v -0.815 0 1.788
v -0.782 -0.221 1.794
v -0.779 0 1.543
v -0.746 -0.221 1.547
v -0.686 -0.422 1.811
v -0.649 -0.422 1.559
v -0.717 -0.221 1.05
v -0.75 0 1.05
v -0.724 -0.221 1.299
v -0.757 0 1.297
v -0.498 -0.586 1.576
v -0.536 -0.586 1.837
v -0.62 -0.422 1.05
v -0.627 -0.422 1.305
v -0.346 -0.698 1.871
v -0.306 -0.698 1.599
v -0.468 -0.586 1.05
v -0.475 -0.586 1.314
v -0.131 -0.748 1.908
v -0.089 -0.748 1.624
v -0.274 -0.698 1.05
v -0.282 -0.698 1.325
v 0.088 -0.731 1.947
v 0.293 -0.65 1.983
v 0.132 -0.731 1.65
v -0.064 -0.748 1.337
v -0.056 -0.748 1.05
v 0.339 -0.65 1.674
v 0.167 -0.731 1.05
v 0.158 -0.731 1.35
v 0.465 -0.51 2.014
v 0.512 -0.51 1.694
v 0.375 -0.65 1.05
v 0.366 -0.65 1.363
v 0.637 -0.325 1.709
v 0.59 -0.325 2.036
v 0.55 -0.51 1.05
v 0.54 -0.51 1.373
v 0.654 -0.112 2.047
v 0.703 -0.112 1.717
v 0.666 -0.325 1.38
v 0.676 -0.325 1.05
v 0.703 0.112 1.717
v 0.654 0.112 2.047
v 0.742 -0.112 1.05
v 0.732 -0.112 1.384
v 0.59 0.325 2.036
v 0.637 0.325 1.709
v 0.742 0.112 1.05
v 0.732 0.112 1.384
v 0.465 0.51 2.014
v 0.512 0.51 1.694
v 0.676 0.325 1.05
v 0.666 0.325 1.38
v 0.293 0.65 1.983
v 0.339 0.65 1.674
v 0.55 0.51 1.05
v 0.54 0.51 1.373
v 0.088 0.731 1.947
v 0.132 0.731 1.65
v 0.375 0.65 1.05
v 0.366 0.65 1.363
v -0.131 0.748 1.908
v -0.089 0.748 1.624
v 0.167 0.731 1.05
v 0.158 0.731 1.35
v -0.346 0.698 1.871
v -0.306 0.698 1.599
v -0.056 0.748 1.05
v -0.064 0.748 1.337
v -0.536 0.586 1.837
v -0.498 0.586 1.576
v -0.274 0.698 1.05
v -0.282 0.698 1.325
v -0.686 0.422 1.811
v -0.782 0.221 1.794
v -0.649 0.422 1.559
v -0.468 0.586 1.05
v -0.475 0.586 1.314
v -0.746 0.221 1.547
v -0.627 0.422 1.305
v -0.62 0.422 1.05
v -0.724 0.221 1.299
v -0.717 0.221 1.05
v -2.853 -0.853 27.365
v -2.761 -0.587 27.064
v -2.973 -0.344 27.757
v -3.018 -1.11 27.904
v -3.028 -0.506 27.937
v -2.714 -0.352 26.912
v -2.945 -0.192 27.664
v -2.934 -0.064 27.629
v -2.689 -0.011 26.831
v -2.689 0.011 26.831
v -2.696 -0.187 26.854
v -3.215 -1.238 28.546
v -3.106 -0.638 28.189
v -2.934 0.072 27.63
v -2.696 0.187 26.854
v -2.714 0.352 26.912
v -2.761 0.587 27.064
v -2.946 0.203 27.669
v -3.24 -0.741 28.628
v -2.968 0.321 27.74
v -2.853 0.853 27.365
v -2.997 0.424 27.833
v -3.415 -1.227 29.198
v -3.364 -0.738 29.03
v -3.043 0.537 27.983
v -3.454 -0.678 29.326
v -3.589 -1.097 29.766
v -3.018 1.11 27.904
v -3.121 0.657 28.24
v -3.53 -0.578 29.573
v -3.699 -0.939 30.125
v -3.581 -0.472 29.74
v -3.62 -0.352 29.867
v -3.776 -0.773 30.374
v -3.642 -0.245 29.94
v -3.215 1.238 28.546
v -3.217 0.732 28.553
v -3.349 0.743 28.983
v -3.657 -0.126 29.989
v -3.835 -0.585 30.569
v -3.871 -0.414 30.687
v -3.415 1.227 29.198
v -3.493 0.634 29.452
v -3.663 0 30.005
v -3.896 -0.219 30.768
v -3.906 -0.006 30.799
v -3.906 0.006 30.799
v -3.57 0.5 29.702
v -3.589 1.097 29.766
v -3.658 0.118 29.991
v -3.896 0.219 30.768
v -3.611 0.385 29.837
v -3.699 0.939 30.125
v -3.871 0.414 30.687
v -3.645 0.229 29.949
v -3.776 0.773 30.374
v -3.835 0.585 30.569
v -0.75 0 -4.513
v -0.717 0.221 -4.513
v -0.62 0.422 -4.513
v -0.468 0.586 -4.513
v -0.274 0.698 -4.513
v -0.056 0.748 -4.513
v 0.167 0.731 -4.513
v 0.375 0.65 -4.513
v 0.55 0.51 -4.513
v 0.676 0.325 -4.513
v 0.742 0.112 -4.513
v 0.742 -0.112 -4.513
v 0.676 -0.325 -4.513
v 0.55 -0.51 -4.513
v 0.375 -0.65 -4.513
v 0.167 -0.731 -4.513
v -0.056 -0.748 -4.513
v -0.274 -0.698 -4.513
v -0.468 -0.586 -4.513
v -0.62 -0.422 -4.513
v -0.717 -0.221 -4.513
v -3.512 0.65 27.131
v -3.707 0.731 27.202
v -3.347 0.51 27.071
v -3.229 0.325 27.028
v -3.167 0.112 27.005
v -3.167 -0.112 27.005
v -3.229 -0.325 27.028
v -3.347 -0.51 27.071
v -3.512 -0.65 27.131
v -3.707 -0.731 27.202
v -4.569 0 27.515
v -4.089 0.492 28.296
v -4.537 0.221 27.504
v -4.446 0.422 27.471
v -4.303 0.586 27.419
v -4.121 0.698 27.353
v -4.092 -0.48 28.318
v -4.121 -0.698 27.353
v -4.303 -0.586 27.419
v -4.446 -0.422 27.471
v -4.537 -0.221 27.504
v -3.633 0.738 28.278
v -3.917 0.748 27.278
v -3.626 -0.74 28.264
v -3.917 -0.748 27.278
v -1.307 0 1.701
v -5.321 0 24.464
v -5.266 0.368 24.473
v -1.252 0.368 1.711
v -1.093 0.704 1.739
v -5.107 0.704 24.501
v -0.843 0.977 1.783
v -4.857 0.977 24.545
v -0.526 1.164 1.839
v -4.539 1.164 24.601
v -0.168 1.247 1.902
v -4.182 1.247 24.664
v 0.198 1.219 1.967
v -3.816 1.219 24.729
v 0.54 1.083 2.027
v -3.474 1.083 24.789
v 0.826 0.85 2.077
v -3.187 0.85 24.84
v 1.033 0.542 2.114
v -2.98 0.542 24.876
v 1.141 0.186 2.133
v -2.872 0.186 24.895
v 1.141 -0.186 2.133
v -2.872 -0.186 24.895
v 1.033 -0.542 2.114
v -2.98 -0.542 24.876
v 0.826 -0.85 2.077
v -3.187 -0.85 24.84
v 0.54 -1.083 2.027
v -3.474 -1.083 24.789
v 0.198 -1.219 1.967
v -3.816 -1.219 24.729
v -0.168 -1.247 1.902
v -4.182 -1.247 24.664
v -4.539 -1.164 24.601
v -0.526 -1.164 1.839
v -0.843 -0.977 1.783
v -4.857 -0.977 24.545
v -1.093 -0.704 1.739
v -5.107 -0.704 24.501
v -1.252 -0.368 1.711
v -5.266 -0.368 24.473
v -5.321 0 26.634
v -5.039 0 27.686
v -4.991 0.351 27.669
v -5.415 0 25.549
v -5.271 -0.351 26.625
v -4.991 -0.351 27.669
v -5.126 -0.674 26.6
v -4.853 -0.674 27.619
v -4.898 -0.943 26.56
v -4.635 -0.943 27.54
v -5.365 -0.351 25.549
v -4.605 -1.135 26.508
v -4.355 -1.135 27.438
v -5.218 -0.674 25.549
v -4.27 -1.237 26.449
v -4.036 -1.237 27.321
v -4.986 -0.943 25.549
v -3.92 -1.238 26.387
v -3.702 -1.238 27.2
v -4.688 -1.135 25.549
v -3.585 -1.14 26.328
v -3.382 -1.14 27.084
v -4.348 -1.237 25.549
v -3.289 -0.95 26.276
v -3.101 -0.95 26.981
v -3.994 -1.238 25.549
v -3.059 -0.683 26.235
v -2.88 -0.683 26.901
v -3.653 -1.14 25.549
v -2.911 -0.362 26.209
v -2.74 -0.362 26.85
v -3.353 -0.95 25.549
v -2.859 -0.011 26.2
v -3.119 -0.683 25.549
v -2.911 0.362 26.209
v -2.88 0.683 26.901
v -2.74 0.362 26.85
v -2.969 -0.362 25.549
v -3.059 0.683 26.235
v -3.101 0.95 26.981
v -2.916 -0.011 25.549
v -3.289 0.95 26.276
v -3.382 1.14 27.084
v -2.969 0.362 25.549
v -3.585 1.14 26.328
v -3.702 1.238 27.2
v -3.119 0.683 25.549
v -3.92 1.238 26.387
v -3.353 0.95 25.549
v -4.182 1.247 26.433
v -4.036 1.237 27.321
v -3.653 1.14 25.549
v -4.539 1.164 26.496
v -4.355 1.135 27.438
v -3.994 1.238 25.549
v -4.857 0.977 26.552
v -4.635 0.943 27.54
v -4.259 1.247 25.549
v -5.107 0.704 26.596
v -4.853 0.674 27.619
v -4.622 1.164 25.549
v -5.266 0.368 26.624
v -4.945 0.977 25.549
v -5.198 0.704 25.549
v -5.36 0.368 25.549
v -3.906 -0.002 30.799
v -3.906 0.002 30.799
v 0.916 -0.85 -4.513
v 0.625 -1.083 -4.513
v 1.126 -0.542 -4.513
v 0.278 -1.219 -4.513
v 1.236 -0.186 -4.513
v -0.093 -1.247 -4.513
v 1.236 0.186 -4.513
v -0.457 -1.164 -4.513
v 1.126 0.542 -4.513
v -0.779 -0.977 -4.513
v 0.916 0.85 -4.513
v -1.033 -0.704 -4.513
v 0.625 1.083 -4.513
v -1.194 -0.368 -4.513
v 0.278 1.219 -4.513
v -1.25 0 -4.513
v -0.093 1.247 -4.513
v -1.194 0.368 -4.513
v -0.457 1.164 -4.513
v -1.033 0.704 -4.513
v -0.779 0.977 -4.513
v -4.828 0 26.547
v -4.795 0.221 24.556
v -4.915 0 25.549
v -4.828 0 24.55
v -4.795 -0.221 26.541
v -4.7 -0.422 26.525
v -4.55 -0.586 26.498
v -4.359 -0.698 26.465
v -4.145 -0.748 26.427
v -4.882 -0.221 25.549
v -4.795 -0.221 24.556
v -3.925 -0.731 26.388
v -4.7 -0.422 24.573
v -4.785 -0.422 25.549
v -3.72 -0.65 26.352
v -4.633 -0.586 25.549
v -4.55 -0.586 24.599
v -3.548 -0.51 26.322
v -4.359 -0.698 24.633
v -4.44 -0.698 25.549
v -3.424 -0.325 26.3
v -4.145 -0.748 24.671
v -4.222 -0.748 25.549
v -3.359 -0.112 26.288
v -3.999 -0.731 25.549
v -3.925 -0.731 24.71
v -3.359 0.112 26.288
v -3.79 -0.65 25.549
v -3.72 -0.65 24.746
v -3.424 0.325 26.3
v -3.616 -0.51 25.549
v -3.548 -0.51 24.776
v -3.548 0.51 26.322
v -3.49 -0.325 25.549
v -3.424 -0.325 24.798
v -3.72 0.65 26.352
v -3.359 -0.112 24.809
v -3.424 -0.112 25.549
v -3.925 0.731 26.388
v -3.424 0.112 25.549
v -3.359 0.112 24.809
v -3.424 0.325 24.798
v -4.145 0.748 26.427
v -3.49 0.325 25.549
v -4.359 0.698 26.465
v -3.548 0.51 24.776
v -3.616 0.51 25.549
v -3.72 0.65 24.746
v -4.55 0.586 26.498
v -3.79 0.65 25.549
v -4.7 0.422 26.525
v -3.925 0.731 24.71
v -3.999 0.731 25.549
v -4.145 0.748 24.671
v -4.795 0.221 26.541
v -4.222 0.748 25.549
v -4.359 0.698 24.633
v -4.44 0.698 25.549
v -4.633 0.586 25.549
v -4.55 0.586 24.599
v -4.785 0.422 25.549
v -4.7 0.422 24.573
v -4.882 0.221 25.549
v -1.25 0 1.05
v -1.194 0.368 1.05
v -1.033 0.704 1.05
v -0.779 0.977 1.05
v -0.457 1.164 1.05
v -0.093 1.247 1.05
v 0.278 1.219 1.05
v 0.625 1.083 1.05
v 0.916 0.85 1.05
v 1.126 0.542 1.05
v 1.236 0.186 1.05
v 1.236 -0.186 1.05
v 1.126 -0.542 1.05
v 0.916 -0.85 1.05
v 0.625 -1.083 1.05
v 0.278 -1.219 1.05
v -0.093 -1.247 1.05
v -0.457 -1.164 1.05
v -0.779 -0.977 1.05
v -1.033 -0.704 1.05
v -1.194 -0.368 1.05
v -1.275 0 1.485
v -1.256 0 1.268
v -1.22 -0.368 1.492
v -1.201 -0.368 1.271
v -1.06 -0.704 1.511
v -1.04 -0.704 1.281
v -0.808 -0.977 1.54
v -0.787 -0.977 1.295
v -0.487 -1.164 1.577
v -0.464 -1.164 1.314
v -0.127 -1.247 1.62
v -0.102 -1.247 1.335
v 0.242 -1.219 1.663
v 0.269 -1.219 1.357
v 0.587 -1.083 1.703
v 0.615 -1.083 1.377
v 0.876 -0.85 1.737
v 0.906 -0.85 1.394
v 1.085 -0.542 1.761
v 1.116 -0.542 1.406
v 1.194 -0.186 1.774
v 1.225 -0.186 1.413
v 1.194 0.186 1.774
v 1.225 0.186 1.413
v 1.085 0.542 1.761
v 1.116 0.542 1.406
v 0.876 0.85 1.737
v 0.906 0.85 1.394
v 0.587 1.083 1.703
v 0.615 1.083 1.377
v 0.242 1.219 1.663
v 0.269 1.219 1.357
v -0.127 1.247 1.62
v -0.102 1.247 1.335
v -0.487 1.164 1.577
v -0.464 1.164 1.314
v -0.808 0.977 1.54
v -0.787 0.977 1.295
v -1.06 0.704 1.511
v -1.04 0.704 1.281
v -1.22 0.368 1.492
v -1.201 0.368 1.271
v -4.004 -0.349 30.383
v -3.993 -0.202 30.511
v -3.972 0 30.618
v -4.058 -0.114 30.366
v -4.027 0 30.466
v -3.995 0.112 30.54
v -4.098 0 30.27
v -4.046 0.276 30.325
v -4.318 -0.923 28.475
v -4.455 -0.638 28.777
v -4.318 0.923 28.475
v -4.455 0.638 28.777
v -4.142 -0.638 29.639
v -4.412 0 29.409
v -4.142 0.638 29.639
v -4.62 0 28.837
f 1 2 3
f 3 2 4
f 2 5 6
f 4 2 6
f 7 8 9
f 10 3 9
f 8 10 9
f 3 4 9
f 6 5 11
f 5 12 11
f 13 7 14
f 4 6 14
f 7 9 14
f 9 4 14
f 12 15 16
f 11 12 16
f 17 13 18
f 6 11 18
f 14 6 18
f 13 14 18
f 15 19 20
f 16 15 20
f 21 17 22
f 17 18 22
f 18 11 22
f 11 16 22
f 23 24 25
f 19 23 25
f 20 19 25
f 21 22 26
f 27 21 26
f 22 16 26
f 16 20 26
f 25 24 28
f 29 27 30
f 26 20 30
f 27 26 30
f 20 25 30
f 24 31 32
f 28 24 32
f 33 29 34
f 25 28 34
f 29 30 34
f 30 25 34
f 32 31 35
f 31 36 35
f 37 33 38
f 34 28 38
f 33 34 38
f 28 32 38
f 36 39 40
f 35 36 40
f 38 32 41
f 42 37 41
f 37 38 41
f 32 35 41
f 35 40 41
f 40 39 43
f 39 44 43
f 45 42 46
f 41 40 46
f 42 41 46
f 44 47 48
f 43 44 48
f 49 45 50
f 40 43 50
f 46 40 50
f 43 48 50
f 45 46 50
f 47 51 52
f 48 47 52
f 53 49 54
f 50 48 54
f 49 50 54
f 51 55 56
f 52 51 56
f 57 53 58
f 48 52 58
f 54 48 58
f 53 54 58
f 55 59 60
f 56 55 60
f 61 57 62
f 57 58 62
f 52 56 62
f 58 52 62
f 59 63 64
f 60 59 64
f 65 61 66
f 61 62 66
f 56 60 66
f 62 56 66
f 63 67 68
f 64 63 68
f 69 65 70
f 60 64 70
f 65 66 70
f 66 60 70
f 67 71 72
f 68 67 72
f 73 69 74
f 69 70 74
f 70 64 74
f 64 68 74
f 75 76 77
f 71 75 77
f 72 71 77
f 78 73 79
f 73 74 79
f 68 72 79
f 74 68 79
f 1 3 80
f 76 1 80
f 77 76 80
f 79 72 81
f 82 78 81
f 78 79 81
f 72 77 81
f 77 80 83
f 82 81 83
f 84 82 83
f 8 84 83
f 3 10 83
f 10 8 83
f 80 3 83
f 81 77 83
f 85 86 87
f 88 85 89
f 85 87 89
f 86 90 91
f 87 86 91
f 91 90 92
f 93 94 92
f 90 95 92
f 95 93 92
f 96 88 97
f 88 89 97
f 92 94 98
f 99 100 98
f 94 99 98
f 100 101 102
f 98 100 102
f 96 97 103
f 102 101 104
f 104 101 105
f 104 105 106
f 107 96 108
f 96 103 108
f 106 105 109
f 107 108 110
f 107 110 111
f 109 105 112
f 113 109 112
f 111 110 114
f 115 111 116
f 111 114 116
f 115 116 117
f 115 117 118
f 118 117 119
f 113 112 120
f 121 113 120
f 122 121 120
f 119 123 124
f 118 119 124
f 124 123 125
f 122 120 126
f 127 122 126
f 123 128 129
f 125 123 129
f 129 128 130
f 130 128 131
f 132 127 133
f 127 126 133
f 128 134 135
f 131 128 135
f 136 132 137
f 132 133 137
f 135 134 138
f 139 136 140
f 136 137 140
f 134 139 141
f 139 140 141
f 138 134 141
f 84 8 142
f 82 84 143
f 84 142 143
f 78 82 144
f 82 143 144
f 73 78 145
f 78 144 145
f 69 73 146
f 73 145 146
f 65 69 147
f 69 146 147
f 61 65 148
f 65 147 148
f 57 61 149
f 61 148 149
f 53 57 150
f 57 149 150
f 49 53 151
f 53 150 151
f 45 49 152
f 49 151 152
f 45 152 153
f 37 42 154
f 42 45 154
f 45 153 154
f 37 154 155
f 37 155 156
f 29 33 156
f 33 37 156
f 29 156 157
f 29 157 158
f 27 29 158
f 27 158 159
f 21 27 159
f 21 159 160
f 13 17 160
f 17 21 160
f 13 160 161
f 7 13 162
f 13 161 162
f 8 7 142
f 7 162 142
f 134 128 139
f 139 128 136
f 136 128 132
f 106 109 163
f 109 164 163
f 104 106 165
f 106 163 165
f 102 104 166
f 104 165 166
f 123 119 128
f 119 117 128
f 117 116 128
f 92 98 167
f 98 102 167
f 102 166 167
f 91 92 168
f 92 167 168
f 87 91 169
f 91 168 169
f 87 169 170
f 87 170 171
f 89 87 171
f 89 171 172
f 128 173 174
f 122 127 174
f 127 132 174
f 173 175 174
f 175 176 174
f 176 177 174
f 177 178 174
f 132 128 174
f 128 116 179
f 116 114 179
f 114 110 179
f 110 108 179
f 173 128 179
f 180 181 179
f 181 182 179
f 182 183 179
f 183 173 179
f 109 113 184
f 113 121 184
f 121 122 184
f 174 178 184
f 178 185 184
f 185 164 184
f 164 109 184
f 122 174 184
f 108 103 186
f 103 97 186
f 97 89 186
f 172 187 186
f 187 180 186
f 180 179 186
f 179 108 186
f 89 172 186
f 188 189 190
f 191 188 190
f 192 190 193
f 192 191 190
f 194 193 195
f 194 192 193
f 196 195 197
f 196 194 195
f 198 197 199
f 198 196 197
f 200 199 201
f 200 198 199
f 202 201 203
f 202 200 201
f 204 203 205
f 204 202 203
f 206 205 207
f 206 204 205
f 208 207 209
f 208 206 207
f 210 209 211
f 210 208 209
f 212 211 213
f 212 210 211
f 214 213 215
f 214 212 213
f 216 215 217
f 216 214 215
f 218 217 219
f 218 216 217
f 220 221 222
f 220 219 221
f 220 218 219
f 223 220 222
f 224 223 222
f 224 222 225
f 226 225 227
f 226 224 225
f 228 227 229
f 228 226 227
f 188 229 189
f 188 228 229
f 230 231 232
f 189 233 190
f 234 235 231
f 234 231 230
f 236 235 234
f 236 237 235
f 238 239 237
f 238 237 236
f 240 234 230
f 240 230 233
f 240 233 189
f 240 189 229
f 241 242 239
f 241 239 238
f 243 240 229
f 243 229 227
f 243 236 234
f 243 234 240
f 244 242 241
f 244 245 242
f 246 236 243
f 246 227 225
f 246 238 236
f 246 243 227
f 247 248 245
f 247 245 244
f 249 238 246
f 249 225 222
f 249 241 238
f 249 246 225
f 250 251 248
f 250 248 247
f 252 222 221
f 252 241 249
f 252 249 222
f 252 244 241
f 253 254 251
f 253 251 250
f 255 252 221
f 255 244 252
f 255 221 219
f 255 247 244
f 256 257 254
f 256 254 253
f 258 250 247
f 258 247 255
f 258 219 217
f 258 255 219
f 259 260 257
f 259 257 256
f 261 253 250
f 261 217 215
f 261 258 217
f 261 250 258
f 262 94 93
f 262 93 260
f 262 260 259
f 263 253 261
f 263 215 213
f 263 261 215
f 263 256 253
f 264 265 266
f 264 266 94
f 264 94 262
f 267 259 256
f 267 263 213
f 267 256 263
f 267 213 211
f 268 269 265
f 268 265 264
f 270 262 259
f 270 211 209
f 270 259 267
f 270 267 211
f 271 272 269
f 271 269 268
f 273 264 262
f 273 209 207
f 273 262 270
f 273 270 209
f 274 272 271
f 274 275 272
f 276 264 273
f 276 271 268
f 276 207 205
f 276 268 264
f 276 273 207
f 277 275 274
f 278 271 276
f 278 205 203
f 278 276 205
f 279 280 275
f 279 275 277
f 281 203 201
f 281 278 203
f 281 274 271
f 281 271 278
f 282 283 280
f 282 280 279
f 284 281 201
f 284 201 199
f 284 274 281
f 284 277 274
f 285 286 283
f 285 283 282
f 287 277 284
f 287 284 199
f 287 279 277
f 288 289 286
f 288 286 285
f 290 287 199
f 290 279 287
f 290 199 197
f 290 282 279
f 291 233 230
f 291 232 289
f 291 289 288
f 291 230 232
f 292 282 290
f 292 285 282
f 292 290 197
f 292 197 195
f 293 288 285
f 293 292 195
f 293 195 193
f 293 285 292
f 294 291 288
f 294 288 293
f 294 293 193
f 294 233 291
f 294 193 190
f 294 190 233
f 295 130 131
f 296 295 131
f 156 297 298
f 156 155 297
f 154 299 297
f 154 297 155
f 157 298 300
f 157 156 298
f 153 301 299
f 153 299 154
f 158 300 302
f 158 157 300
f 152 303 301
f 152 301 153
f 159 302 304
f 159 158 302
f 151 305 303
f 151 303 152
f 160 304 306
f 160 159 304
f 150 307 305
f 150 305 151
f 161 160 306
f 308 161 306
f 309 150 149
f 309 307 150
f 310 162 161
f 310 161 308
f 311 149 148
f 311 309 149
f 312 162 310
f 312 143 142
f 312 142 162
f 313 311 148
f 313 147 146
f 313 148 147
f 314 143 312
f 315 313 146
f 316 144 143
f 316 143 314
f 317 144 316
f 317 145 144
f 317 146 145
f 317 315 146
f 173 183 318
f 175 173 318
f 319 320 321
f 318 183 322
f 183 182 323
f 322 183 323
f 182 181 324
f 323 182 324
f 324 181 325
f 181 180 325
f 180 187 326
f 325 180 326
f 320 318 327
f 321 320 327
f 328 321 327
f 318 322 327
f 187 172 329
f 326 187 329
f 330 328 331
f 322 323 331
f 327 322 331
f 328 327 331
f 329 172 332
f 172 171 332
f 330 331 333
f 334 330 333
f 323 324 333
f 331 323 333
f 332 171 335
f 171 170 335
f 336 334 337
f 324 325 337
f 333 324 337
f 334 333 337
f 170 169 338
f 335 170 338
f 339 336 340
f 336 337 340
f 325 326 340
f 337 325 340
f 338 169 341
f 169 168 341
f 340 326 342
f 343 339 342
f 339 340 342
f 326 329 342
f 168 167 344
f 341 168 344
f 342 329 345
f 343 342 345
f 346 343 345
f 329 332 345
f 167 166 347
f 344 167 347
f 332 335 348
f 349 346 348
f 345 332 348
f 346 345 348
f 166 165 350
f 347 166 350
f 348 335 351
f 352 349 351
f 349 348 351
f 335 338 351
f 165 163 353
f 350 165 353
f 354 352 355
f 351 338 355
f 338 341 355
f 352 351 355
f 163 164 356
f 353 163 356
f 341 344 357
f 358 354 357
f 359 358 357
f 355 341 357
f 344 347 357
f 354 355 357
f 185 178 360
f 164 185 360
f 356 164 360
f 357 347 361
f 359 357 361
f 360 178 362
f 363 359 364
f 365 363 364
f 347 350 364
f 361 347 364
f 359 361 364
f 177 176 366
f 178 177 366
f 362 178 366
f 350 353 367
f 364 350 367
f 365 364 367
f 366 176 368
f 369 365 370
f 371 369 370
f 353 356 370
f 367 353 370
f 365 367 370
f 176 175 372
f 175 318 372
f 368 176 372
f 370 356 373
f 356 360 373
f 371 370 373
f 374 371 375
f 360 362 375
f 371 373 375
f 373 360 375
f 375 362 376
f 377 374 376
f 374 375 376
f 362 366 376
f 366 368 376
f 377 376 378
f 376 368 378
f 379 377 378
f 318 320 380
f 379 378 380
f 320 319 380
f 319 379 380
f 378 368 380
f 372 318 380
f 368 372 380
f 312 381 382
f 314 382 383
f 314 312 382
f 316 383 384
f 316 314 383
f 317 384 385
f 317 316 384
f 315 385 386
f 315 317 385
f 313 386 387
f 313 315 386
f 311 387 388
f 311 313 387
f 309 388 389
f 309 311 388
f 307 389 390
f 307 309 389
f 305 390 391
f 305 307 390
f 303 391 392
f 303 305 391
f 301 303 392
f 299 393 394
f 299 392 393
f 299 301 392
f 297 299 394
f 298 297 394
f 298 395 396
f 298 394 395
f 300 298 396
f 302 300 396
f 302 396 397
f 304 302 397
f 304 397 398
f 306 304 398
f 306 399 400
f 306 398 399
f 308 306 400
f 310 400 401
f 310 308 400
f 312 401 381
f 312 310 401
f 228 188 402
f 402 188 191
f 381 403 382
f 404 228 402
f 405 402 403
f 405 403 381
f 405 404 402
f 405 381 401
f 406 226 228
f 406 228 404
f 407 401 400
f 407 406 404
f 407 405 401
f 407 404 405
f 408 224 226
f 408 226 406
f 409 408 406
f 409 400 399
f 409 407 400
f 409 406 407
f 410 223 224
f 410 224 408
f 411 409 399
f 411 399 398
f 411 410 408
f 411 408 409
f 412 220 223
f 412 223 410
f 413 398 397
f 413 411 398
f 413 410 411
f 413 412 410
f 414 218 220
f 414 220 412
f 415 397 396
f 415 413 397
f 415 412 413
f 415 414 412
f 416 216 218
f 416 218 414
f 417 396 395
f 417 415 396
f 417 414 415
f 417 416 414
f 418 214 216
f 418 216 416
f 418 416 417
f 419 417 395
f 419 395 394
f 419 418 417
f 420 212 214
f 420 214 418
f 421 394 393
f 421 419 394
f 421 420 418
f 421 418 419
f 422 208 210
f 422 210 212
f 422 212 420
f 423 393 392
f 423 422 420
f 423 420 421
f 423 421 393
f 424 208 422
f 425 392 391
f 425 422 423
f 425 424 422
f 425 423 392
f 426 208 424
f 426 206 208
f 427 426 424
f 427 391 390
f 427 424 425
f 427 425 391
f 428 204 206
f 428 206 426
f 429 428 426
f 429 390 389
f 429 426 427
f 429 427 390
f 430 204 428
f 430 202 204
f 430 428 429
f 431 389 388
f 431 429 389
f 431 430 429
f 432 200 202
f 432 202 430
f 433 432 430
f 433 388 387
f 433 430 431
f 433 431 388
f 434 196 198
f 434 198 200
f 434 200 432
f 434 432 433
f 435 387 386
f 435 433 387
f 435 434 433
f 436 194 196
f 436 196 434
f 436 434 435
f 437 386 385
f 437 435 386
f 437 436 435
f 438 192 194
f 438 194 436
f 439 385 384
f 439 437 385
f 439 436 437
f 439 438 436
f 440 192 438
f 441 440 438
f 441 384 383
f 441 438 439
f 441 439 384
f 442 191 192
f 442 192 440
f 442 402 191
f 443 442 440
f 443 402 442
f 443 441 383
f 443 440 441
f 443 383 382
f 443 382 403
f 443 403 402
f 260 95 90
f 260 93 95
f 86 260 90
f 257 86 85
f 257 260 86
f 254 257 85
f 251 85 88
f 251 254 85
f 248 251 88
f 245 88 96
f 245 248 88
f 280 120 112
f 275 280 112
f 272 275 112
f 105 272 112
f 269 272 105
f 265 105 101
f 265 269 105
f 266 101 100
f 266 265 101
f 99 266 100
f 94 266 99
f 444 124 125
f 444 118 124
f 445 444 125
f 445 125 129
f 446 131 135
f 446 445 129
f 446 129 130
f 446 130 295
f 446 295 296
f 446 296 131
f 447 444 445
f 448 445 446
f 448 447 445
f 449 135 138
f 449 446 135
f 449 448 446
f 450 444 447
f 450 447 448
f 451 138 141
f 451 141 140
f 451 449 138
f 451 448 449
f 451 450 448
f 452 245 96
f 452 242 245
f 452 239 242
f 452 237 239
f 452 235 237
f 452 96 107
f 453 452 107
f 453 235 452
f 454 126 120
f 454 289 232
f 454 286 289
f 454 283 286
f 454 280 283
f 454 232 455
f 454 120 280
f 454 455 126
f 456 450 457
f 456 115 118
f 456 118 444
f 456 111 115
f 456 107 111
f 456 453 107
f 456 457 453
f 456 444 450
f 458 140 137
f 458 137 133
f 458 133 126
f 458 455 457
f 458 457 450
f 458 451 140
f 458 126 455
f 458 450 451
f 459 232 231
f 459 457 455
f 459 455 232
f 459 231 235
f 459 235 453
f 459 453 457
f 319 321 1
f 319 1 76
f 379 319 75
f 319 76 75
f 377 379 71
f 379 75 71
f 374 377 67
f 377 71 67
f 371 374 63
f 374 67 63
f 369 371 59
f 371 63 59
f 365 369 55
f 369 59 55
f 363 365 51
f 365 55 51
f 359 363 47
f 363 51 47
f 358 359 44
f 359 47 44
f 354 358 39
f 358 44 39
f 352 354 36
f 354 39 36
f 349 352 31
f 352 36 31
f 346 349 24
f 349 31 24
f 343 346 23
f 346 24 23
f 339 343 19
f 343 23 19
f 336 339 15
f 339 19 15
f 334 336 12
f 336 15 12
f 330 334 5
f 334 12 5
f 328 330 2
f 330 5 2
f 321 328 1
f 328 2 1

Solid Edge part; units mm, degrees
sketch "Sketch1" plane through (0, 0, 0) normal (0, -1, 0) x (1, 0, 0)
  line L0 (0, 1.05) -> (0, -4.5126)
  arc A0 (-0.076, 1.9182) -> (0, 1.05) centre (-5, 1.05) cw
  line L1 (-4.0896, 24.6806) -> (-0.076, 1.9182)
  arc A1 (-4.0896, 24.6806) -> (-3.864, 27.2589) centre (0.8345, 25.5488) cw
  line L2 (-3.864, 27.2589) -> (-2.7312, 30.3715)
sketch "Sketch2" plane through (0, 0, -4.5126) normal (0, 0, -1) x (-1, 0, 0)
  circle A0 centre (0, 0) radius 1.25
  dimension "D1" = 0.5
sweep "SweptProtrusion_2" add profiles "Sketch2" path "Sketch1"
sketch "Sketch3" plane through (0, 0, 0) normal (0, -1, 0) x (1, 0, 0)
  line L0 (0, 1.05) -> (0, -4.5126)
  arc A0 (-0.076, 1.9182) -> (0, 1.05) centre (-5, 1.05) cw
  line L1 (-4.0896, 24.6806) -> (-0.076, 1.9182)
  arc A1 (-4.0896, 24.6806) -> (-3.864, 27.2589) centre (0.8345, 25.5488) cw
  line L2 (-3.864, 27.2589) -> (-2.7312, 30.3715)
sketch "Sketch4" plane through (0, 0, -4.5126) normal (0, 0, -1) x (-1, 0, 0)
  circle A0 centre (0, 0) radius 0.75
  dimension "D1" = 0.5
sweep "SweptCutout_1" cut profiles "Sketch4" path "Sketch3"
sketch "Sketch5" plane through (0, 0, 0) normal (0, -1, 0) x (1, 0, 0)
  line L0 (-3.9058, 30.799) -> (-2.6894, 26.8314)
extrude "ExtrudedCutout_1" cut sketch "Sketch5" along normal mid plane 7.6718 material side at (-3.2498, 0, 28.8299)
properties material "Galvanized steel"
